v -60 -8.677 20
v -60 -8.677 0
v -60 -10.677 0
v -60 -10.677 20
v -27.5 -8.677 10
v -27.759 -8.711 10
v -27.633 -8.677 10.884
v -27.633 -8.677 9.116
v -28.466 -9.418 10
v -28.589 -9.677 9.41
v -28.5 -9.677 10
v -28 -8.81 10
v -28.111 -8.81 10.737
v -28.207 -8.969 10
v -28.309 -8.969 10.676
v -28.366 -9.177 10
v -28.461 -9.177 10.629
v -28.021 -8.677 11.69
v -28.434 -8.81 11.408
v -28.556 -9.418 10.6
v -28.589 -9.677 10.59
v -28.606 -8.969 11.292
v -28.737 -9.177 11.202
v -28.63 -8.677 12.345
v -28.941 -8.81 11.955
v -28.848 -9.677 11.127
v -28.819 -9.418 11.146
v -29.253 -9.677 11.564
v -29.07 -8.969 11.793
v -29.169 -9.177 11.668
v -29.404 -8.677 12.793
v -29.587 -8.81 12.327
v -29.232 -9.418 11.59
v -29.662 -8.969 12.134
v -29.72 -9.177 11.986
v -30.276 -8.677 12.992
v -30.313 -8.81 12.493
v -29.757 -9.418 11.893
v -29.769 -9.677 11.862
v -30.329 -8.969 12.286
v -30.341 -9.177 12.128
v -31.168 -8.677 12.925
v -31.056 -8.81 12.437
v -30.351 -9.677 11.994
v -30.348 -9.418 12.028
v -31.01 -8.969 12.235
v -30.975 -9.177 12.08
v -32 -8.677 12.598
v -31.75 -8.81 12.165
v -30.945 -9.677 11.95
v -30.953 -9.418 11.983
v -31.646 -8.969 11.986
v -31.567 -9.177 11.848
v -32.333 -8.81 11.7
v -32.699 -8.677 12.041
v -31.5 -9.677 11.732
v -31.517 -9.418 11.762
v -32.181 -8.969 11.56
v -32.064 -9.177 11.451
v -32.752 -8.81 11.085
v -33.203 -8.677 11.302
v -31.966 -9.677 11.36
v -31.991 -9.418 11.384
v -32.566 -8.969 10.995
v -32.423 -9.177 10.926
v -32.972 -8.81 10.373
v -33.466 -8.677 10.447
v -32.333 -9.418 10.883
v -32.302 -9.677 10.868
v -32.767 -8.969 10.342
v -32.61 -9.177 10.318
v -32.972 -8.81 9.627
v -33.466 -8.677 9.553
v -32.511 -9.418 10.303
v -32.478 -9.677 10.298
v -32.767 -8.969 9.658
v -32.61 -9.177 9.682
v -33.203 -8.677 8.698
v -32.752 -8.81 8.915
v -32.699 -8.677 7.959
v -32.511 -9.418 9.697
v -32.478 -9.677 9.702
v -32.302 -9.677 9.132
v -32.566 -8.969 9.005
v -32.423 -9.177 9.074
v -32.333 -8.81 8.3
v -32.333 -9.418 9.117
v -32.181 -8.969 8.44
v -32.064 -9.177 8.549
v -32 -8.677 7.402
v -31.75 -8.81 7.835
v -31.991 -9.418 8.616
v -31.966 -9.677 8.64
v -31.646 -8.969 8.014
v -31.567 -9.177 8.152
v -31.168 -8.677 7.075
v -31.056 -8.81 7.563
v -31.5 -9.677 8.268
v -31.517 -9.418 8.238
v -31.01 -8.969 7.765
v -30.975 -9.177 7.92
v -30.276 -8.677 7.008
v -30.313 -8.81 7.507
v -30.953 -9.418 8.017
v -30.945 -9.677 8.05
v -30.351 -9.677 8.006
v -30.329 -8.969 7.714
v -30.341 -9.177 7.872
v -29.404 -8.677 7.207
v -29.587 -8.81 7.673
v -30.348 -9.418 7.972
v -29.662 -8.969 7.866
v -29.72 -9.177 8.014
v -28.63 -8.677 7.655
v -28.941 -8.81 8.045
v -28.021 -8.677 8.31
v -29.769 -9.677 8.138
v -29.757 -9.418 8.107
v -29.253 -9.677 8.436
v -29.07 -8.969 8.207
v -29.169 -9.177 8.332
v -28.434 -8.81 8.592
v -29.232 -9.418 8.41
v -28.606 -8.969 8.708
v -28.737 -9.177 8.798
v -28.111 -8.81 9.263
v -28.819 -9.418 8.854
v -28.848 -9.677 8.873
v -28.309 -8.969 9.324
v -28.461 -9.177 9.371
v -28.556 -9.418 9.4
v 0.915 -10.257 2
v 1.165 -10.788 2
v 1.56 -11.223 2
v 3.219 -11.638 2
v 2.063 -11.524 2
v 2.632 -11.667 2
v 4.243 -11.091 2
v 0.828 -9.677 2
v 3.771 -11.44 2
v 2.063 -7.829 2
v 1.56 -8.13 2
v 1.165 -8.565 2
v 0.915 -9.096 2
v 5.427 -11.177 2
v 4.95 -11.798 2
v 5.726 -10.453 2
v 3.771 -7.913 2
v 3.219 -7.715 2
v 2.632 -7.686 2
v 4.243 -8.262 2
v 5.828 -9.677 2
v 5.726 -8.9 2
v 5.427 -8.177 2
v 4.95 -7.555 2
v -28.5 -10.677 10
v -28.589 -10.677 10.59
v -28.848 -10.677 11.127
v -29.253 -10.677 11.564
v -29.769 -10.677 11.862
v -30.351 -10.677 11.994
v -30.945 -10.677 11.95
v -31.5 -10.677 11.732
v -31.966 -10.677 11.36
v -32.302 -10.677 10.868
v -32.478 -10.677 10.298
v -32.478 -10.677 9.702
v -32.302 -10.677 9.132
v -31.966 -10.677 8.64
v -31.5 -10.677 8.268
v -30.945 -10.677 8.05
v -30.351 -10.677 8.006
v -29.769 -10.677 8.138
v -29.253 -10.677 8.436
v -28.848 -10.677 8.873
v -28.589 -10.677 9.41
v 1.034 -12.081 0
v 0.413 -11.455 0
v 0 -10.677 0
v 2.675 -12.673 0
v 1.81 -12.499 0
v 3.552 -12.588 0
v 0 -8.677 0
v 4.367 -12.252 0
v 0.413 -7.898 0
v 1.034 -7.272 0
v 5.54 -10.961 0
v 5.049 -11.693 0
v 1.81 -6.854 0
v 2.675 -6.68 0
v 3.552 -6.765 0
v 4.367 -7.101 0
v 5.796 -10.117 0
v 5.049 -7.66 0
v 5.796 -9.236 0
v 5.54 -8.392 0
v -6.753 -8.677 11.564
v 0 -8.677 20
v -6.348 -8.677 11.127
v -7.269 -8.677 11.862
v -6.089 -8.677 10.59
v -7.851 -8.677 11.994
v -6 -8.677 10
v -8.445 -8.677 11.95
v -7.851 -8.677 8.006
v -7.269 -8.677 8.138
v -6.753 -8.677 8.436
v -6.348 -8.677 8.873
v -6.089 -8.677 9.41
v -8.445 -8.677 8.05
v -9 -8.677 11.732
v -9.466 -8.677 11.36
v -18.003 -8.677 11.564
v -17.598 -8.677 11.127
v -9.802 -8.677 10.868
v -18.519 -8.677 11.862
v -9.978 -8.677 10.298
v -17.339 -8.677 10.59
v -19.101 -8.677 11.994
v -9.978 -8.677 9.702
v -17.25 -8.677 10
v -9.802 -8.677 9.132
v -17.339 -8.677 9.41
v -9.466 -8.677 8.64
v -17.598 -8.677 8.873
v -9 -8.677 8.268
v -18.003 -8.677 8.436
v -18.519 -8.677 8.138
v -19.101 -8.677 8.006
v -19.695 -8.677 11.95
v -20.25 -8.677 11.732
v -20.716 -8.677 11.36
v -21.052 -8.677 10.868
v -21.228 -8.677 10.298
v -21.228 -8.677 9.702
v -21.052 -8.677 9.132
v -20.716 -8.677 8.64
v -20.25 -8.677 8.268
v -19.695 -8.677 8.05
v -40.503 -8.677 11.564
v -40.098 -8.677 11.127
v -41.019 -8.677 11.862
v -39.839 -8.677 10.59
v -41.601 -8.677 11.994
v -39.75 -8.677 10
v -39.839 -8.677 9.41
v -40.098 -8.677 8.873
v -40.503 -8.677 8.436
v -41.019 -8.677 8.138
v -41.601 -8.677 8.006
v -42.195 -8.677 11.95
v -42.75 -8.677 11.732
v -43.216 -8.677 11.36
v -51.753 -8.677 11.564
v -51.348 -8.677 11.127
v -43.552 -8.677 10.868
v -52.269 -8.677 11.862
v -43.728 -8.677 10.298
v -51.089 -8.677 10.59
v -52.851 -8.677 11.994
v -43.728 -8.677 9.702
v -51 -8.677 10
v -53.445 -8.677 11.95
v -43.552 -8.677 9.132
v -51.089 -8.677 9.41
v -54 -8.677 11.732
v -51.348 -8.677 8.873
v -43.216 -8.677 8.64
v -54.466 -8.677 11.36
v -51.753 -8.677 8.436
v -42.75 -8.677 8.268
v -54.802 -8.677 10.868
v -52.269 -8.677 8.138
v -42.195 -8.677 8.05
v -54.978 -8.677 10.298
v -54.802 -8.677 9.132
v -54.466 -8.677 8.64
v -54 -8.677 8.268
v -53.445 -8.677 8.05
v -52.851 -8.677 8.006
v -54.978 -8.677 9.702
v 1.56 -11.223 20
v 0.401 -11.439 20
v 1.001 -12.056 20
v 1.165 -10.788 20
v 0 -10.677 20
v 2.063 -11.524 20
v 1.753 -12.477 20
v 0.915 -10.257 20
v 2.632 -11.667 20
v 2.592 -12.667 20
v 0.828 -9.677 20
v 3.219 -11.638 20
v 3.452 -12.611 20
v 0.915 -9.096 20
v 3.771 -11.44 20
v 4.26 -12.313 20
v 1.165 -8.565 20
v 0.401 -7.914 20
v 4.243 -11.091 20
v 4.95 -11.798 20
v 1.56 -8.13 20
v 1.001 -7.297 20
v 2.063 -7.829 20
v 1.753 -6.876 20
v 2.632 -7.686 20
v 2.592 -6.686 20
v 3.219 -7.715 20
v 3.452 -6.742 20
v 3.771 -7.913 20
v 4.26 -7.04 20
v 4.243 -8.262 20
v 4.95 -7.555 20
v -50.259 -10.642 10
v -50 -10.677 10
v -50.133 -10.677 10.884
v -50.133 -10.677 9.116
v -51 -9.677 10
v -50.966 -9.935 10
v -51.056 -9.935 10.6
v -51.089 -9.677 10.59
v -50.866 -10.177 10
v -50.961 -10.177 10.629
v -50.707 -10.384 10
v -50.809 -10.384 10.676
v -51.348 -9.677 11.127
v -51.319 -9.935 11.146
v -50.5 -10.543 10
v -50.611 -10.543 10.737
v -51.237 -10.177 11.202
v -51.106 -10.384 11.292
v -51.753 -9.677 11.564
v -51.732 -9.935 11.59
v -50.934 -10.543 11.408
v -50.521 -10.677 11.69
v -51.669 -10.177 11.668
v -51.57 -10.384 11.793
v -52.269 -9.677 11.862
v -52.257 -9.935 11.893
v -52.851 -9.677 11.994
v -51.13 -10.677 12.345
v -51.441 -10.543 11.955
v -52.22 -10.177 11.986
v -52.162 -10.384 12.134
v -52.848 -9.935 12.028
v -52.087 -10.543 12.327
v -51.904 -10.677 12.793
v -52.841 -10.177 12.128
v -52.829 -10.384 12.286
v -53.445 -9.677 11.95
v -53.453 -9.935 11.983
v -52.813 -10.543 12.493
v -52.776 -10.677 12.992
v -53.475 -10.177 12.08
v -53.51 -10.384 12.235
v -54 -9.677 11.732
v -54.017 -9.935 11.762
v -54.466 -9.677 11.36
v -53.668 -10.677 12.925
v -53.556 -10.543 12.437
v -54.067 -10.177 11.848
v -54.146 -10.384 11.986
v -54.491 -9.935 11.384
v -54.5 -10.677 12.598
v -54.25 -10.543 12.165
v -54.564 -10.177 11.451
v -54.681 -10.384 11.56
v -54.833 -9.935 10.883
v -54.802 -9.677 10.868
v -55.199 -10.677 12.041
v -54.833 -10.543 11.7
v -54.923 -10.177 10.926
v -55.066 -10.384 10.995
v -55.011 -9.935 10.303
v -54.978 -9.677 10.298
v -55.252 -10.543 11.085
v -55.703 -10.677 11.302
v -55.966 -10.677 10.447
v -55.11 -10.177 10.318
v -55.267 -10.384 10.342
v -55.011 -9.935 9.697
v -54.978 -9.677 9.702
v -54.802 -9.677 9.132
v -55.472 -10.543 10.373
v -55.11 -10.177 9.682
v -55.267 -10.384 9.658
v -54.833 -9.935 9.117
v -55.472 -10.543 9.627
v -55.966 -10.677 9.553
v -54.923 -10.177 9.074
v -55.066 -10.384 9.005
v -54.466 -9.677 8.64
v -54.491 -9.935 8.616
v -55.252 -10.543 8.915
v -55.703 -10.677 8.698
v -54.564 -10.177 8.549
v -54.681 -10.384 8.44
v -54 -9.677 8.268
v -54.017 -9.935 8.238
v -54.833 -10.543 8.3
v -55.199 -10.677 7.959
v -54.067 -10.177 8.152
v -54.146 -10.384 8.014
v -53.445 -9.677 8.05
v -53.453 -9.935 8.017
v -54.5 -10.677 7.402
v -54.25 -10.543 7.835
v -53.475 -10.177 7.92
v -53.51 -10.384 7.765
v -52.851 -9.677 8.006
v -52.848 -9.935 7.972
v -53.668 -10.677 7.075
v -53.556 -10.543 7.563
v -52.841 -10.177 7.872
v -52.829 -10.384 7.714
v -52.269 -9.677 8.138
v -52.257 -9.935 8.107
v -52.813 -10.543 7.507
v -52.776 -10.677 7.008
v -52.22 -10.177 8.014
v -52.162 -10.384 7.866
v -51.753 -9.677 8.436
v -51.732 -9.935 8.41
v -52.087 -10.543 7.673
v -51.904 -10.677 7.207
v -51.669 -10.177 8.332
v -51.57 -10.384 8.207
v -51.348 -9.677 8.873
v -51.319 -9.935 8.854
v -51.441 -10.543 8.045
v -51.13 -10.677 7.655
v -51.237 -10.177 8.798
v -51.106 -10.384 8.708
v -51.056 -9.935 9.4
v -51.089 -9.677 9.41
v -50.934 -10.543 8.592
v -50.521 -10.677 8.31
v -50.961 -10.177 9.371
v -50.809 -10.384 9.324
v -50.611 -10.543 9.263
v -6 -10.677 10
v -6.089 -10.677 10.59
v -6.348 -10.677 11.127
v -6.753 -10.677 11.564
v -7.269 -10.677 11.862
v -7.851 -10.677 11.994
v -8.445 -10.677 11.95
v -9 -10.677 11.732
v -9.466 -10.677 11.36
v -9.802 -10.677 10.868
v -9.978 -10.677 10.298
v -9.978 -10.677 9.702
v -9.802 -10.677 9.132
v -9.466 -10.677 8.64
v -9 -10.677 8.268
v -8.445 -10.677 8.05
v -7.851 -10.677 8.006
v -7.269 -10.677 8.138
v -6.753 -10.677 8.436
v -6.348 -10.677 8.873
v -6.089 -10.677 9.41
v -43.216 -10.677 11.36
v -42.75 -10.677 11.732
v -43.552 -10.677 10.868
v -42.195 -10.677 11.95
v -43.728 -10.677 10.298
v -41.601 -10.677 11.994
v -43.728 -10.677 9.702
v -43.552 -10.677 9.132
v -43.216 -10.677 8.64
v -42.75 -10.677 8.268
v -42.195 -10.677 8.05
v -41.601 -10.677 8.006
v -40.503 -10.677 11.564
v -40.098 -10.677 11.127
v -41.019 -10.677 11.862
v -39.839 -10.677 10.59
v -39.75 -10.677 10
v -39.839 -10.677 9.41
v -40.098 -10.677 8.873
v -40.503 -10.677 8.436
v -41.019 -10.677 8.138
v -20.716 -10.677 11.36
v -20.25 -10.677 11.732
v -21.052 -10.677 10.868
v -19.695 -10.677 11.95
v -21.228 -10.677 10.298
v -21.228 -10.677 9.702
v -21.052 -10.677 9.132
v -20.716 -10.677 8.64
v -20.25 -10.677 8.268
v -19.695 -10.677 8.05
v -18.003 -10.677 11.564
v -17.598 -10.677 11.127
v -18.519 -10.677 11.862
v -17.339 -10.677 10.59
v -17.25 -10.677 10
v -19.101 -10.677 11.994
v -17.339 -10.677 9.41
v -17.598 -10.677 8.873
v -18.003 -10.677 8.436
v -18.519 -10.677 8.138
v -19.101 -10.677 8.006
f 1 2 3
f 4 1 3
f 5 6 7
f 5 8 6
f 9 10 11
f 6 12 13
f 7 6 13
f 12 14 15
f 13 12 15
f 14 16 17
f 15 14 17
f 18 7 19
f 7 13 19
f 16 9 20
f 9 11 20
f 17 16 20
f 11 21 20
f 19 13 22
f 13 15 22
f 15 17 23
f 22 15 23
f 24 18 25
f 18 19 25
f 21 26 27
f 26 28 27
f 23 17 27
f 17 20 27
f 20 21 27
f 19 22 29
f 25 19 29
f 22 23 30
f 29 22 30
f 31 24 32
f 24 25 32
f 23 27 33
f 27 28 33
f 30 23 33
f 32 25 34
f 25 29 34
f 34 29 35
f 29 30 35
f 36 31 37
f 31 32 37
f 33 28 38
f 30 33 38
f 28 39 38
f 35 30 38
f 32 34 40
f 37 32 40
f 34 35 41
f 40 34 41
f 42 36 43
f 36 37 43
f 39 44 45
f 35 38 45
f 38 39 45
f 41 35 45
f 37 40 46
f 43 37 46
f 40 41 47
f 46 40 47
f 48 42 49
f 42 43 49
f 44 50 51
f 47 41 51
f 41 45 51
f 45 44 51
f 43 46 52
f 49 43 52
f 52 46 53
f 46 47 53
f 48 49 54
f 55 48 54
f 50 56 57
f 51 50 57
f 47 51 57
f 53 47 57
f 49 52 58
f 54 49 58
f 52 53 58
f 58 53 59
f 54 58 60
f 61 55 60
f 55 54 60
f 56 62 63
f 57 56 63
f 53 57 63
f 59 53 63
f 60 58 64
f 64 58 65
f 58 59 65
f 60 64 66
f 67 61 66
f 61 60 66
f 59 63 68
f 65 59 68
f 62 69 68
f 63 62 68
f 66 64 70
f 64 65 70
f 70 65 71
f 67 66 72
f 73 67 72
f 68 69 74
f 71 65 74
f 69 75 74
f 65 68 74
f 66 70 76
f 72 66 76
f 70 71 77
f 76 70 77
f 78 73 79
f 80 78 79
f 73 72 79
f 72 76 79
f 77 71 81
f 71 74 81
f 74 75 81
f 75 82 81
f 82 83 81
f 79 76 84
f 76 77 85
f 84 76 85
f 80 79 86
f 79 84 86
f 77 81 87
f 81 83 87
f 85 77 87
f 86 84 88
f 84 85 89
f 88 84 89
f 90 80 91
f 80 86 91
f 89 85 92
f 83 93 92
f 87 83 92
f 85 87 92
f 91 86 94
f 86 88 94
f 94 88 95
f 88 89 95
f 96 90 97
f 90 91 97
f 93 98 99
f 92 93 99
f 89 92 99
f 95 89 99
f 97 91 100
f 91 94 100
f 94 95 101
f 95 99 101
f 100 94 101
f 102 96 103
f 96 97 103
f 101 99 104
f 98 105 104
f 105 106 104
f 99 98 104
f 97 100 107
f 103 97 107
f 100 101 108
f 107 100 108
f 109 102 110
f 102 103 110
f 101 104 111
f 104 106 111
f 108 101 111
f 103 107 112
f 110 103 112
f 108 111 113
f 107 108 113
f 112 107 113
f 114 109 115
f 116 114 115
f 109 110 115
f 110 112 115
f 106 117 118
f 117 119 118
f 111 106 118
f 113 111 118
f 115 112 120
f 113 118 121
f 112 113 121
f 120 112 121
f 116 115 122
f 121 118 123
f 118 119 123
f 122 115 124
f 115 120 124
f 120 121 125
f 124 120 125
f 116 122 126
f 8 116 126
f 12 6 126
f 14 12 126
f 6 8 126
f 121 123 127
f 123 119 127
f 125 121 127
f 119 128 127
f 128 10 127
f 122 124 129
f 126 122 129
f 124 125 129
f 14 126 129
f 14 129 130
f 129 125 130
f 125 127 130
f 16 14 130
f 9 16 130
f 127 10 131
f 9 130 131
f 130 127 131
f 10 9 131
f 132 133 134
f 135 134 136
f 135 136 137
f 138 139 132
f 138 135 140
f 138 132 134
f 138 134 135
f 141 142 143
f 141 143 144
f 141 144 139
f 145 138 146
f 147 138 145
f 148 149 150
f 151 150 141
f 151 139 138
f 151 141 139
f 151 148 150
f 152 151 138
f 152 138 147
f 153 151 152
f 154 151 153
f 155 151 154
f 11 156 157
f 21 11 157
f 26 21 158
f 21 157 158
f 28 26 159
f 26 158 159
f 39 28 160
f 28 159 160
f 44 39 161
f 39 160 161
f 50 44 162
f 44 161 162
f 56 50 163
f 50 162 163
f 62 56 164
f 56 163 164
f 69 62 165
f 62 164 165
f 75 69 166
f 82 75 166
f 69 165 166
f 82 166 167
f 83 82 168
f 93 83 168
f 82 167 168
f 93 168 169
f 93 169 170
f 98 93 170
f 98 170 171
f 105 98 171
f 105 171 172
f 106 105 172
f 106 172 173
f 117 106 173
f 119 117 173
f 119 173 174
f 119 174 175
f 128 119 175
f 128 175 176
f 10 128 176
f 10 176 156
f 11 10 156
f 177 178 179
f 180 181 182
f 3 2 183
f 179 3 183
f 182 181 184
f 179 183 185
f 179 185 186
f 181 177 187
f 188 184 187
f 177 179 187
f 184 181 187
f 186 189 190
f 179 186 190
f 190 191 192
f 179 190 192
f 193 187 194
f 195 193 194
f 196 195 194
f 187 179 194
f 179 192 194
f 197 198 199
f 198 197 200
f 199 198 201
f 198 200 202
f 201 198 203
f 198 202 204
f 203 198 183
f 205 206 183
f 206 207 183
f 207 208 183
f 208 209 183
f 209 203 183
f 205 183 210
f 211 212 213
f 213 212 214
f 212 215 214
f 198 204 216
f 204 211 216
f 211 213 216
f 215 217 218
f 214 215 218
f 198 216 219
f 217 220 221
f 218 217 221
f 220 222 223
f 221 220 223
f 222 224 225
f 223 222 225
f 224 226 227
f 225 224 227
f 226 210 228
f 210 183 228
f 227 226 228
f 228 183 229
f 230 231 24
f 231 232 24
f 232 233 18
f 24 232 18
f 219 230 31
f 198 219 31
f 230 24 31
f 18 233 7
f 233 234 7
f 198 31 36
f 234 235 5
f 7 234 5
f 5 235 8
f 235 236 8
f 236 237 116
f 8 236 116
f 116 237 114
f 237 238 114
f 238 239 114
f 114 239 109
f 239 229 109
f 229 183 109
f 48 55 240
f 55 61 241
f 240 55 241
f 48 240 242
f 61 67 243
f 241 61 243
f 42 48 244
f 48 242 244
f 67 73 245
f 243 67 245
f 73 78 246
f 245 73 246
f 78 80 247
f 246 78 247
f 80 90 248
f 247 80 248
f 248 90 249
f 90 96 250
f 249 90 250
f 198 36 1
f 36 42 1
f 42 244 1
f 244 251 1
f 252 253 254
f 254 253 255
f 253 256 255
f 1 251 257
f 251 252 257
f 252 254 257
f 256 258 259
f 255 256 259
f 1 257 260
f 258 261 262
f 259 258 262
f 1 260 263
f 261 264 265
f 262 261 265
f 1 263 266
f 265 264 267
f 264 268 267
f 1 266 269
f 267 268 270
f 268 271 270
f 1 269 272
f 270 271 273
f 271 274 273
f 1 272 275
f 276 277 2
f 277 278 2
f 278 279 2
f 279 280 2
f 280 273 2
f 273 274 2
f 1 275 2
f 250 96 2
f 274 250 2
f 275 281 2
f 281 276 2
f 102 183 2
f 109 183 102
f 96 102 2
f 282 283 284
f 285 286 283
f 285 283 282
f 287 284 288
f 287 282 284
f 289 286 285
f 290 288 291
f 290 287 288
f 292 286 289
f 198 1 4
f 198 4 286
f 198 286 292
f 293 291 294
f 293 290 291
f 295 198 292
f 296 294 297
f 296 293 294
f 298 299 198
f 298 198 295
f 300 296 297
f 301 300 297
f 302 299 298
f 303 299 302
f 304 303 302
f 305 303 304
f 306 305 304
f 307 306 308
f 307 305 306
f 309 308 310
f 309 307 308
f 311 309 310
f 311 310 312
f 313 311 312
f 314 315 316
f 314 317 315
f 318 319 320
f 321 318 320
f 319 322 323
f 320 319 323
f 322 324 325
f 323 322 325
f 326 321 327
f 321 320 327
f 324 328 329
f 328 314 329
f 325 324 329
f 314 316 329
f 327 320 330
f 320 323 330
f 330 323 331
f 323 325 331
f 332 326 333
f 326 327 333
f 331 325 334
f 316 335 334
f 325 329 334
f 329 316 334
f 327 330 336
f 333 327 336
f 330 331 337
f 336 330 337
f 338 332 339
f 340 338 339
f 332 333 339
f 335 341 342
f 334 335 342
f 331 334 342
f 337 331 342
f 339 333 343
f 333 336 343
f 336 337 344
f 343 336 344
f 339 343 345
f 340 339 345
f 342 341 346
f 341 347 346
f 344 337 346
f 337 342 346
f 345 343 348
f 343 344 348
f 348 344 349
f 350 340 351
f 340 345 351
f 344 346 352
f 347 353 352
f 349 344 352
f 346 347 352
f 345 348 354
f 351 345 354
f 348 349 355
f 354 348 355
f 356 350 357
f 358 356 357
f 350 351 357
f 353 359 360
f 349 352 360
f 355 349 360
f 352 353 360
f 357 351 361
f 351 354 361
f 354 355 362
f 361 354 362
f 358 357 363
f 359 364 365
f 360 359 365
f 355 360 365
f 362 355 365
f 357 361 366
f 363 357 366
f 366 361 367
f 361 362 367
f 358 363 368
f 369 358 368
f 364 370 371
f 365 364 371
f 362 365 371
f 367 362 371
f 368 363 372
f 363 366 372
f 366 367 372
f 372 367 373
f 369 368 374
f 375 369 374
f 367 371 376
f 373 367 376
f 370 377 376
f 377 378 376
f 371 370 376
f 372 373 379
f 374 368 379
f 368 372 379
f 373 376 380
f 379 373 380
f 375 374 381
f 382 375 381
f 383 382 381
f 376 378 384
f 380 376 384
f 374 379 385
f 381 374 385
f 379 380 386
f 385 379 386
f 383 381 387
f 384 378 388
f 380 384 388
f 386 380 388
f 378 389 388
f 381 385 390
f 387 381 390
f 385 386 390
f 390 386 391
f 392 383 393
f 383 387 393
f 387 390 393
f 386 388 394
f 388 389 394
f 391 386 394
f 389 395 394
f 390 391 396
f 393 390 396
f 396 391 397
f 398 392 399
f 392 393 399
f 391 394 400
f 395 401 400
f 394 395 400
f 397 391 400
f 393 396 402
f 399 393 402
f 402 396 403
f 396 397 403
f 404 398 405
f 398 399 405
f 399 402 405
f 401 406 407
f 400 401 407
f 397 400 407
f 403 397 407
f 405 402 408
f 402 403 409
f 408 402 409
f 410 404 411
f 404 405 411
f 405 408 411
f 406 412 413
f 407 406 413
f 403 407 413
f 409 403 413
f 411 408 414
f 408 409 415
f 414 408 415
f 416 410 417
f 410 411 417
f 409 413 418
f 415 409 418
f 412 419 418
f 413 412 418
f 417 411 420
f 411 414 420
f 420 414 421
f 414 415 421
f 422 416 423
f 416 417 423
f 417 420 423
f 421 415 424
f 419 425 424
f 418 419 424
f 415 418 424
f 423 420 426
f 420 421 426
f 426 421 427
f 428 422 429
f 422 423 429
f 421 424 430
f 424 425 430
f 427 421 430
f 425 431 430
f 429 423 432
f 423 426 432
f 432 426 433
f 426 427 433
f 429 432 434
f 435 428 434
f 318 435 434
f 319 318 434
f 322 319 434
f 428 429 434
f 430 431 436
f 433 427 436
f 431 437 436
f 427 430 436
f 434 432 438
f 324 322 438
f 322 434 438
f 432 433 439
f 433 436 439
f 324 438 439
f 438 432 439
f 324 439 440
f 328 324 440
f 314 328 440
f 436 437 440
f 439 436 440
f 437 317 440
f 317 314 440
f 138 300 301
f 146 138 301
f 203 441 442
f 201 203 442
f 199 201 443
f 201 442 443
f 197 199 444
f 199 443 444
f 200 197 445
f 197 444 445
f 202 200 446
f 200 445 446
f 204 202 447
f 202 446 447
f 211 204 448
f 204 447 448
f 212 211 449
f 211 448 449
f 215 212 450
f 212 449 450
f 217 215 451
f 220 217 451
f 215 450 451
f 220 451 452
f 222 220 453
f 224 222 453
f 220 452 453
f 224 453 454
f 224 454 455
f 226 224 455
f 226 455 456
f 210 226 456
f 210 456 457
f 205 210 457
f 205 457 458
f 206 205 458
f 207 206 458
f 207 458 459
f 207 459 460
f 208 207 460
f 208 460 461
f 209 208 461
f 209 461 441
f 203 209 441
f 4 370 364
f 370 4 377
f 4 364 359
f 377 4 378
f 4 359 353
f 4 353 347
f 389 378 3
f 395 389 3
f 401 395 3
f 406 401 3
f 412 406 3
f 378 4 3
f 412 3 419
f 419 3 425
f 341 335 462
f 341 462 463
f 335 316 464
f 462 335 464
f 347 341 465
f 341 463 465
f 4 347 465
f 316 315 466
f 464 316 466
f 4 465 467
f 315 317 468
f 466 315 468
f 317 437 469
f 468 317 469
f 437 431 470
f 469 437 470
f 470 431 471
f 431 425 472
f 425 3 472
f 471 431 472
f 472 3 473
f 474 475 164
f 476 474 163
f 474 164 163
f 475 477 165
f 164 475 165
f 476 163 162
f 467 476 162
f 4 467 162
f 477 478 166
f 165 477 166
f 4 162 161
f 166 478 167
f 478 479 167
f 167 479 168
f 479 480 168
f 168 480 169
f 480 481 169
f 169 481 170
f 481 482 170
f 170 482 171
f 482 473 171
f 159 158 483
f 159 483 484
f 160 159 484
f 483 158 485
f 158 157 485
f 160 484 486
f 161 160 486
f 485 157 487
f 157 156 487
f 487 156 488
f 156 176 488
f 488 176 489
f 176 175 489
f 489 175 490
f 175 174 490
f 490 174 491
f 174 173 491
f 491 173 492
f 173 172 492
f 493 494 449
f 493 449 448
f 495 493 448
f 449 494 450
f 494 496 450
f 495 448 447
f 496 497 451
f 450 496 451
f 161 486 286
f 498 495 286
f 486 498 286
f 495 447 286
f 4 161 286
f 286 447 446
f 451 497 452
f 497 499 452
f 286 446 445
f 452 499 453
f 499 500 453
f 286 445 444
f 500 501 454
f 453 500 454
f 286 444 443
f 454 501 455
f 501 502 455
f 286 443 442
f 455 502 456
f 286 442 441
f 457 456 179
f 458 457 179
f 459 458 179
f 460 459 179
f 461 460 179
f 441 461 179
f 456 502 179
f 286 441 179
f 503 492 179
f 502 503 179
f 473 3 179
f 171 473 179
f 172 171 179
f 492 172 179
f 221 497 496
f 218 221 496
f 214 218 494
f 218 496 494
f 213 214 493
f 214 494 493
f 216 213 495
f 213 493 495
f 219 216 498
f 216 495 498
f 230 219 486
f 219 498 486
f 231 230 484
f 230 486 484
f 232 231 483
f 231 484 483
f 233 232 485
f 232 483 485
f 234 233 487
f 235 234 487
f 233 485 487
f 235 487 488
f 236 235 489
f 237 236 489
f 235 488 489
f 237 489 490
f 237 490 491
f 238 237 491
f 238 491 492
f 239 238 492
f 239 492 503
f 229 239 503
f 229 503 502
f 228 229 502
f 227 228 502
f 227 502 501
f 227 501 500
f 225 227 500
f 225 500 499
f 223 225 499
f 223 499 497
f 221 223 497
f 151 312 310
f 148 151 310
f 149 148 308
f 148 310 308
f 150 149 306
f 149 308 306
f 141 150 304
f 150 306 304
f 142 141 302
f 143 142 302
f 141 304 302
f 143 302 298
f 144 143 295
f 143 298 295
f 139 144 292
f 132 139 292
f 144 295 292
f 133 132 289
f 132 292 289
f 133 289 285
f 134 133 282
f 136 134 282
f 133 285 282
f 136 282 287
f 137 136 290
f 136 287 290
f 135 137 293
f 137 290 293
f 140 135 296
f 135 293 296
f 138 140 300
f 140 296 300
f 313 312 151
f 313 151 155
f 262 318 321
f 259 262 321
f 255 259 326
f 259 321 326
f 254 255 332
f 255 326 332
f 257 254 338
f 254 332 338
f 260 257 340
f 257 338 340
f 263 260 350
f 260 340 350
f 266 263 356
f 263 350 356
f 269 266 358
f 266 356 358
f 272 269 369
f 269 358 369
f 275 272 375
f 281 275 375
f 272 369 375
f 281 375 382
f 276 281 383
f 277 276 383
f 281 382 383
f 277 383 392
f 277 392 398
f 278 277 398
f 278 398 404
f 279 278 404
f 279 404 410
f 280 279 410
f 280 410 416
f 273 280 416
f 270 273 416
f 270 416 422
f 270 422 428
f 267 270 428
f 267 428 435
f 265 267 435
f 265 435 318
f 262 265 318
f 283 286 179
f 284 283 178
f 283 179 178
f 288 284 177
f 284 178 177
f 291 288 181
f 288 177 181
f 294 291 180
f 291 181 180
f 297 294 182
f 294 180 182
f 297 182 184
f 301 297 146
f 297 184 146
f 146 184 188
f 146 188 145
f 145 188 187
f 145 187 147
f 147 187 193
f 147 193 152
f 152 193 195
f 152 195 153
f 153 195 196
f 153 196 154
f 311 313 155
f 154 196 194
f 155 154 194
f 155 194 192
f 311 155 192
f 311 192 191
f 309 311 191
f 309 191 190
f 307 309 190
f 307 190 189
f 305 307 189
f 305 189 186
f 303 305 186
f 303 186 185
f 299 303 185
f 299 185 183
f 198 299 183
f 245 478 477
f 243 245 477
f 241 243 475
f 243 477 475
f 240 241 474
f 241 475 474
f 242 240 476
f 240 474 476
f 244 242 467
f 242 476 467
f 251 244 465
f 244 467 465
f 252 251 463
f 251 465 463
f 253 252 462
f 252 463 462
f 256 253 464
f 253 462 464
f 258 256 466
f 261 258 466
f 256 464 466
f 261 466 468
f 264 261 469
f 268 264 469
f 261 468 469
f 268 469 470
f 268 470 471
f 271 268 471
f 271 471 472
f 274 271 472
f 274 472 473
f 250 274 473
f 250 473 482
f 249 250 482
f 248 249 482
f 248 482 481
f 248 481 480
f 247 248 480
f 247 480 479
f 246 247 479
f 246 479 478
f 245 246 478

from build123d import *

# Parameters (mm, degrees)
PAD001_DEPTH           = 20
SKETCH003_R            = 2
POCKET001_DEPTH        = 4.001
LINEARPATTERN001_COUNT = 5
LINEARPATTERN001_PITCH = 11.25
POCKET002_DEPTH        = 18
FILLET_R               = 1
FILLET001_R            = 1


with BuildPart() as part:
    # Sketch002 → Pad001 (new body)
    with BuildSketch(Plane.XY):
        with BuildLine():
            Line((0, -8.676507), (-60, -8.676507))
            Line((-60, -8.676507), (-60, -10.676507))
            Line((-60, -10.676507), (0, -10.676507))
            ThreePointArc((0, -10.676507), (5.828427, -9.676507), (0, -8.676507))
        make_face()
    extrude(amount=PAD001_DEPTH)

    # Sketch003 → Pocket001 (cut, through all)
    with BuildSketch(Plane.XZ.offset(10.676507)):
        with Locations((-53, 10)):
            Circle(SKETCH003_R)
    pocket001 = extrude(amount=-POCKET001_DEPTH, mode=Mode.SUBTRACT)

    # LinearPattern001: Pocket001 ×5
    with Locations(*[(i * LINEARPATTERN001_PITCH, 0, 0) for i in range(1, LINEARPATTERN001_COUNT)]):
        add(pocket001, mode=Mode.SUBTRACT)

    # Sketch005 → Pocket002 (cut)
    with BuildSketch(Plane.XY.offset(20)):
        with BuildLine():
            ThreePointArc((5.527045, -12.375125), (6.644849, -9.676507), (5.527045, -6.97789))
            Line((4.242641, -8.262294), (5.527045, -6.97789))
            ThreePointArc((4.242641, -8.262294), (0.828427, -9.676507), (4.242641, -11.090721))
            Line((4.242641, -11.090721), (5.527045, -12.375125))
        make_face()
    extrude(amount=-POCKET002_DEPTH, mode=Mode.SUBTRACT)

    # Fillet
    fillet_edges = [part.edges().sort_by_distance(p)[0] for p in [
        (-55, -10.676507, 10),
    ]]
    fillet(fillet_edges, radius=FILLET_R)

    # Fillet001
    fillet001_edges = [part.edges().sort_by_distance(p)[0] for p in [
        (-32.5, -8.676507, 10),
    ]]
    fillet(fillet001_edges, radius=FILLET001_R)


solid = part.part
